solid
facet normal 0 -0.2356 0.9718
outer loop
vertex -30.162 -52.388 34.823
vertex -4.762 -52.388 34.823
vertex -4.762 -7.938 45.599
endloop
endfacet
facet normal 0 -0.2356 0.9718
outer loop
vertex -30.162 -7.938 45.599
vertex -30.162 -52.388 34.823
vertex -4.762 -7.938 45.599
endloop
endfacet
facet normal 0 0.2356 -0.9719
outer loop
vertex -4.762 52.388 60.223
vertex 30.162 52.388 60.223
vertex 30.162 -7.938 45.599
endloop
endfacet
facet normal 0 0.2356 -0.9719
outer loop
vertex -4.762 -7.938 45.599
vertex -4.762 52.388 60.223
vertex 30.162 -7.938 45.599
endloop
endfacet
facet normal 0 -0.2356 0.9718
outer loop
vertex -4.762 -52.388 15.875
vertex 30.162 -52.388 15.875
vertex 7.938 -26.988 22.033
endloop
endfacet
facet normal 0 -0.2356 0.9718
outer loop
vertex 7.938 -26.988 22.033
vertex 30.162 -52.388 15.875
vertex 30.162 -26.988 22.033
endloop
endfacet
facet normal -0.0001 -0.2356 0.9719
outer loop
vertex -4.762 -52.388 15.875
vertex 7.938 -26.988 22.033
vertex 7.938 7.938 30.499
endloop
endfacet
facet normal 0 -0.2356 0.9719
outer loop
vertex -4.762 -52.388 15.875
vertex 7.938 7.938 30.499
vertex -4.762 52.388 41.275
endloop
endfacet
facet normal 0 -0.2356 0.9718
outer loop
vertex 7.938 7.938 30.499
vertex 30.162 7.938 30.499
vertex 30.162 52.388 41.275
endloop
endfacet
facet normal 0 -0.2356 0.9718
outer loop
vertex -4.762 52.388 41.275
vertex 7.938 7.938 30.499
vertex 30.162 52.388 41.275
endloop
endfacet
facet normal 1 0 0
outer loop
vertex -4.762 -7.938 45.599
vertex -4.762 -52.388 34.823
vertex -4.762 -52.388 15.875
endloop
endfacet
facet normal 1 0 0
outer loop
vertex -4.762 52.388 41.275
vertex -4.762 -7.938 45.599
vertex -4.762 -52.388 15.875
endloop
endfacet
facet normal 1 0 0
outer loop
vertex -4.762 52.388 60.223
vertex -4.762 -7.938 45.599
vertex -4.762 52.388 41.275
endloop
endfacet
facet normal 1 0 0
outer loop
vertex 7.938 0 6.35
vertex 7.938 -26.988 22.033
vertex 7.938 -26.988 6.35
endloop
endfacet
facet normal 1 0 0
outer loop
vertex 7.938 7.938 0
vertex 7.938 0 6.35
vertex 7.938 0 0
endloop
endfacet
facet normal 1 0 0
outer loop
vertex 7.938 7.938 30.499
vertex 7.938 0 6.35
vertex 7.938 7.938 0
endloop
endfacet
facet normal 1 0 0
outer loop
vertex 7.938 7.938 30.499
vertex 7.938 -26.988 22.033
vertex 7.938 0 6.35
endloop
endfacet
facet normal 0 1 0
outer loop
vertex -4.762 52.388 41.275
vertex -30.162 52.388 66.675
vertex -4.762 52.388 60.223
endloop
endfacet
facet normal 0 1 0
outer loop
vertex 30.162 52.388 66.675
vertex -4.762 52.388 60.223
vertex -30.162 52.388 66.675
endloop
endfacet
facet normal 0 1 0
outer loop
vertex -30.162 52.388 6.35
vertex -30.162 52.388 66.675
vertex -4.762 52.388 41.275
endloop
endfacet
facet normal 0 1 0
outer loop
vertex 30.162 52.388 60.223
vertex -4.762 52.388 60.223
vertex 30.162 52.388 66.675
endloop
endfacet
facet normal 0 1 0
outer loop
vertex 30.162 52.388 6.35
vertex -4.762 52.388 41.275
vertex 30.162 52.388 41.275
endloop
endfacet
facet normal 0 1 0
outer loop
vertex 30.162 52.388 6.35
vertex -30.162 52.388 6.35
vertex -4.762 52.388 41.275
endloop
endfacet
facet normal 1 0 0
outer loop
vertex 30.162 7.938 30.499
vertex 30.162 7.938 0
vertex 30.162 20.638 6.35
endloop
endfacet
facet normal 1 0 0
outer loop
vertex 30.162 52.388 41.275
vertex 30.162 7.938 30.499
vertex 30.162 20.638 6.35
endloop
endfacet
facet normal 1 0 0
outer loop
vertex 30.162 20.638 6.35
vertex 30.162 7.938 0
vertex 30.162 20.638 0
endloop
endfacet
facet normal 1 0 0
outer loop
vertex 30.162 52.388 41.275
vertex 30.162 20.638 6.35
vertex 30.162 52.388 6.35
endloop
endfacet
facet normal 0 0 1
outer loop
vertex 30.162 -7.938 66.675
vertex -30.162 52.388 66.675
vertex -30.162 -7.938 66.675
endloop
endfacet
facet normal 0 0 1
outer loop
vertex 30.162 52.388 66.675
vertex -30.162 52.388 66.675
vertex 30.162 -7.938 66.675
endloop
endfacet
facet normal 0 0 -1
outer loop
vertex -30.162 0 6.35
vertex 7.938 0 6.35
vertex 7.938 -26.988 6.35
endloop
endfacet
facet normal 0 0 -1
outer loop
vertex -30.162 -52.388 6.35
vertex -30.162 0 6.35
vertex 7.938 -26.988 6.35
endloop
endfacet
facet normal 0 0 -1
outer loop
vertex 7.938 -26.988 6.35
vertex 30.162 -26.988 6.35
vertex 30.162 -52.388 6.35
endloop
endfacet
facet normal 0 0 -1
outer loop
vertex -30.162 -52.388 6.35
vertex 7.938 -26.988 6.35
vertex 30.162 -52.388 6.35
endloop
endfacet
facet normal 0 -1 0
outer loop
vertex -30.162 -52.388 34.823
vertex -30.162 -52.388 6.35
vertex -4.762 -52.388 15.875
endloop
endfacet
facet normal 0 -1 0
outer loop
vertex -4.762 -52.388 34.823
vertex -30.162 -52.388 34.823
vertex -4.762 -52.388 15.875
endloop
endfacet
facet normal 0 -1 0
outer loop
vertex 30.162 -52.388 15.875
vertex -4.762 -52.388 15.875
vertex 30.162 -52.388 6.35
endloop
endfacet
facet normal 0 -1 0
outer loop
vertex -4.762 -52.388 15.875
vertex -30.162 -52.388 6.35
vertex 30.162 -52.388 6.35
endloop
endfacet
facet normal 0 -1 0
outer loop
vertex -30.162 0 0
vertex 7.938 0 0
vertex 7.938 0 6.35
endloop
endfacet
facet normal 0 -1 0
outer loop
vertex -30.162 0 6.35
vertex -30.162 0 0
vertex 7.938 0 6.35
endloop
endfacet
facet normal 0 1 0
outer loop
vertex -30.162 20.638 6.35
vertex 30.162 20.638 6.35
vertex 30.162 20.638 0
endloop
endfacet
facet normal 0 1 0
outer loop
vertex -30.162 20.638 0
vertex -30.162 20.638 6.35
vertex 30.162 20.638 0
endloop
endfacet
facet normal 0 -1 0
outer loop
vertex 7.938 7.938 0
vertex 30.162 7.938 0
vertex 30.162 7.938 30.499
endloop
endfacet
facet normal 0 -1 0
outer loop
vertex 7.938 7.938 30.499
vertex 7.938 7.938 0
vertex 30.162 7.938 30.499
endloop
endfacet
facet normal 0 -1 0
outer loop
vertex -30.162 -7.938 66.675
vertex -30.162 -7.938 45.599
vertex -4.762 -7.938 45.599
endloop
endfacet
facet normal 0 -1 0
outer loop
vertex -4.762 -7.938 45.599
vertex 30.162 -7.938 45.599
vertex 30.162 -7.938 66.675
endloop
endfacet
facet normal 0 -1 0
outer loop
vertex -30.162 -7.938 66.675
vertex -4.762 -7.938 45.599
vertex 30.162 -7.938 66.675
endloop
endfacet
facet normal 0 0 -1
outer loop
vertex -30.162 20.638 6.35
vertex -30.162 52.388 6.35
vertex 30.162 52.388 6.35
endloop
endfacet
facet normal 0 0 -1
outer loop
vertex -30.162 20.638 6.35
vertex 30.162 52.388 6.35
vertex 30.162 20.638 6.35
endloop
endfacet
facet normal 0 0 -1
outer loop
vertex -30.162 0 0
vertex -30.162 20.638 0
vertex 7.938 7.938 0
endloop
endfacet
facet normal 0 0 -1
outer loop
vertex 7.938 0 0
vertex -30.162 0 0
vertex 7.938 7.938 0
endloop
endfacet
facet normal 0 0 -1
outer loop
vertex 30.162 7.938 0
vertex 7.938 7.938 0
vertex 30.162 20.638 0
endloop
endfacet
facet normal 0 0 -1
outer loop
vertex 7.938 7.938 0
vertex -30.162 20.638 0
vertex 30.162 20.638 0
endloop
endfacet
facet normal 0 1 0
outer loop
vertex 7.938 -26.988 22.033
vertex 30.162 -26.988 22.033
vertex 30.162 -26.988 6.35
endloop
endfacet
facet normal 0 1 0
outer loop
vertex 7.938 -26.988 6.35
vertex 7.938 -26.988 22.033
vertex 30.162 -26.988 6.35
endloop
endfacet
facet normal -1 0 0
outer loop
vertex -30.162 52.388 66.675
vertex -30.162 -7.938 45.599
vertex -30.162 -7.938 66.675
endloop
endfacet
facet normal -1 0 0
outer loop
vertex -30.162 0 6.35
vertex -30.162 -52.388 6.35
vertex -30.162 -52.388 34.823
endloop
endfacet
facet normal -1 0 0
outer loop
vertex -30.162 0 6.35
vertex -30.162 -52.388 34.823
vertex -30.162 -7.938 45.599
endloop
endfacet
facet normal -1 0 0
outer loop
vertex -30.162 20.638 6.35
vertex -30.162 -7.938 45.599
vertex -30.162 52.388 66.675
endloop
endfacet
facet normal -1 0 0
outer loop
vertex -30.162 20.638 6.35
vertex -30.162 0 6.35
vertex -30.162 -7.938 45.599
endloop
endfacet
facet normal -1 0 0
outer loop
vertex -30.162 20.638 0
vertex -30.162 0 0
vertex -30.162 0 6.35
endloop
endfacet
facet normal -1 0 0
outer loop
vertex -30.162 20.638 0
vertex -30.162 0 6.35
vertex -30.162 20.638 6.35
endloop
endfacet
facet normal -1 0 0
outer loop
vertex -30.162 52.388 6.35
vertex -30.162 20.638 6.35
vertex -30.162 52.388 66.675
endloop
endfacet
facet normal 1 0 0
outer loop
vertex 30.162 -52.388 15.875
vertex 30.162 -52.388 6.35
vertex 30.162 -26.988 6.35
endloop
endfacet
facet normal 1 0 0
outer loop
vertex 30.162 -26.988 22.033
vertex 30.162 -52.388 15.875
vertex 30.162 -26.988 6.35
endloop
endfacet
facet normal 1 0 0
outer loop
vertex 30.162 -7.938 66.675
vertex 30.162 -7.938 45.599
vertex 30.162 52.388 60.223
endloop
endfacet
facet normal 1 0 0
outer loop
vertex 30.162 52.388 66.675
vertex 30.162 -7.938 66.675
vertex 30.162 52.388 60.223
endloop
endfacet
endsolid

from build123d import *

# Parameters (mm, degrees)
F0_W     = 60.325
F0_H     = 104.775
F1_DEPTH = 66.675
F3_DEPTH = 34.925
F5_DEPTH = 22.225
F6_W     = 26.9875
F6_H     = 6.35
F6_W_2   = 25.4
F7_DEPTH = 60.326
F9_DEPTH = 60.326


with BuildPart() as f1:
    # F0 (on Top) → F1 (new body)
    with BuildSketch(Plane.XY):
        Rectangle(F0_W, F0_H)
    extrude(amount=F1_DEPTH)

    # F2 (on face) → F3 (cut)
    with BuildSketch(Plane.YZ.offset(30.1625)):
        Polygon((-52.3875, 34.8233953258), (-52.3875, 15.875), (52.3875, 41.275), (52.3875, 60.2233953258), align=None)
    extrude(amount=-F3_DEPTH, mode=Mode.SUBTRACT)

    # F4 (on face) → F5 (cut)
    with BuildSketch(Plane.YZ.offset(30.1625)):
        Polygon((7.9375, 0), (7.9375, 30.4992424242), (-26.9875, 22.0325757576), (-26.9875, 0), align=None)
    extrude(amount=-F5_DEPTH, mode=Mode.SUBTRACT)

    # F6 (on face) → F7 (cut, through all)
    with BuildSketch(Plane.YZ.offset(30.1625)):
        with Locations((-13.49375, 3.175)):
            Rectangle(F6_W, F6_H)
        with Locations((-39.6875, 3.175)):
            Rectangle(F6_W_2, F6_H)
        Polygon((52.8014078736, 0), (52.5065548718, 6.35), (20.6375, 6.35), (20.6375, 0), align=None)
    extrude(amount=-F7_DEPTH, mode=Mode.SUBTRACT)

    # F8 (on face) → F9 (cut, through all)
    with BuildSketch(Plane.YZ.offset(30.1625)):
        Polygon((-7.9375, 45.5991529015), (-7.9375, 66.675), (-52.3875, 66.675), (-52.3875, 34.8233953258), align=None)
    extrude(amount=-F9_DEPTH, mode=Mode.SUBTRACT)


solid = f1.part
